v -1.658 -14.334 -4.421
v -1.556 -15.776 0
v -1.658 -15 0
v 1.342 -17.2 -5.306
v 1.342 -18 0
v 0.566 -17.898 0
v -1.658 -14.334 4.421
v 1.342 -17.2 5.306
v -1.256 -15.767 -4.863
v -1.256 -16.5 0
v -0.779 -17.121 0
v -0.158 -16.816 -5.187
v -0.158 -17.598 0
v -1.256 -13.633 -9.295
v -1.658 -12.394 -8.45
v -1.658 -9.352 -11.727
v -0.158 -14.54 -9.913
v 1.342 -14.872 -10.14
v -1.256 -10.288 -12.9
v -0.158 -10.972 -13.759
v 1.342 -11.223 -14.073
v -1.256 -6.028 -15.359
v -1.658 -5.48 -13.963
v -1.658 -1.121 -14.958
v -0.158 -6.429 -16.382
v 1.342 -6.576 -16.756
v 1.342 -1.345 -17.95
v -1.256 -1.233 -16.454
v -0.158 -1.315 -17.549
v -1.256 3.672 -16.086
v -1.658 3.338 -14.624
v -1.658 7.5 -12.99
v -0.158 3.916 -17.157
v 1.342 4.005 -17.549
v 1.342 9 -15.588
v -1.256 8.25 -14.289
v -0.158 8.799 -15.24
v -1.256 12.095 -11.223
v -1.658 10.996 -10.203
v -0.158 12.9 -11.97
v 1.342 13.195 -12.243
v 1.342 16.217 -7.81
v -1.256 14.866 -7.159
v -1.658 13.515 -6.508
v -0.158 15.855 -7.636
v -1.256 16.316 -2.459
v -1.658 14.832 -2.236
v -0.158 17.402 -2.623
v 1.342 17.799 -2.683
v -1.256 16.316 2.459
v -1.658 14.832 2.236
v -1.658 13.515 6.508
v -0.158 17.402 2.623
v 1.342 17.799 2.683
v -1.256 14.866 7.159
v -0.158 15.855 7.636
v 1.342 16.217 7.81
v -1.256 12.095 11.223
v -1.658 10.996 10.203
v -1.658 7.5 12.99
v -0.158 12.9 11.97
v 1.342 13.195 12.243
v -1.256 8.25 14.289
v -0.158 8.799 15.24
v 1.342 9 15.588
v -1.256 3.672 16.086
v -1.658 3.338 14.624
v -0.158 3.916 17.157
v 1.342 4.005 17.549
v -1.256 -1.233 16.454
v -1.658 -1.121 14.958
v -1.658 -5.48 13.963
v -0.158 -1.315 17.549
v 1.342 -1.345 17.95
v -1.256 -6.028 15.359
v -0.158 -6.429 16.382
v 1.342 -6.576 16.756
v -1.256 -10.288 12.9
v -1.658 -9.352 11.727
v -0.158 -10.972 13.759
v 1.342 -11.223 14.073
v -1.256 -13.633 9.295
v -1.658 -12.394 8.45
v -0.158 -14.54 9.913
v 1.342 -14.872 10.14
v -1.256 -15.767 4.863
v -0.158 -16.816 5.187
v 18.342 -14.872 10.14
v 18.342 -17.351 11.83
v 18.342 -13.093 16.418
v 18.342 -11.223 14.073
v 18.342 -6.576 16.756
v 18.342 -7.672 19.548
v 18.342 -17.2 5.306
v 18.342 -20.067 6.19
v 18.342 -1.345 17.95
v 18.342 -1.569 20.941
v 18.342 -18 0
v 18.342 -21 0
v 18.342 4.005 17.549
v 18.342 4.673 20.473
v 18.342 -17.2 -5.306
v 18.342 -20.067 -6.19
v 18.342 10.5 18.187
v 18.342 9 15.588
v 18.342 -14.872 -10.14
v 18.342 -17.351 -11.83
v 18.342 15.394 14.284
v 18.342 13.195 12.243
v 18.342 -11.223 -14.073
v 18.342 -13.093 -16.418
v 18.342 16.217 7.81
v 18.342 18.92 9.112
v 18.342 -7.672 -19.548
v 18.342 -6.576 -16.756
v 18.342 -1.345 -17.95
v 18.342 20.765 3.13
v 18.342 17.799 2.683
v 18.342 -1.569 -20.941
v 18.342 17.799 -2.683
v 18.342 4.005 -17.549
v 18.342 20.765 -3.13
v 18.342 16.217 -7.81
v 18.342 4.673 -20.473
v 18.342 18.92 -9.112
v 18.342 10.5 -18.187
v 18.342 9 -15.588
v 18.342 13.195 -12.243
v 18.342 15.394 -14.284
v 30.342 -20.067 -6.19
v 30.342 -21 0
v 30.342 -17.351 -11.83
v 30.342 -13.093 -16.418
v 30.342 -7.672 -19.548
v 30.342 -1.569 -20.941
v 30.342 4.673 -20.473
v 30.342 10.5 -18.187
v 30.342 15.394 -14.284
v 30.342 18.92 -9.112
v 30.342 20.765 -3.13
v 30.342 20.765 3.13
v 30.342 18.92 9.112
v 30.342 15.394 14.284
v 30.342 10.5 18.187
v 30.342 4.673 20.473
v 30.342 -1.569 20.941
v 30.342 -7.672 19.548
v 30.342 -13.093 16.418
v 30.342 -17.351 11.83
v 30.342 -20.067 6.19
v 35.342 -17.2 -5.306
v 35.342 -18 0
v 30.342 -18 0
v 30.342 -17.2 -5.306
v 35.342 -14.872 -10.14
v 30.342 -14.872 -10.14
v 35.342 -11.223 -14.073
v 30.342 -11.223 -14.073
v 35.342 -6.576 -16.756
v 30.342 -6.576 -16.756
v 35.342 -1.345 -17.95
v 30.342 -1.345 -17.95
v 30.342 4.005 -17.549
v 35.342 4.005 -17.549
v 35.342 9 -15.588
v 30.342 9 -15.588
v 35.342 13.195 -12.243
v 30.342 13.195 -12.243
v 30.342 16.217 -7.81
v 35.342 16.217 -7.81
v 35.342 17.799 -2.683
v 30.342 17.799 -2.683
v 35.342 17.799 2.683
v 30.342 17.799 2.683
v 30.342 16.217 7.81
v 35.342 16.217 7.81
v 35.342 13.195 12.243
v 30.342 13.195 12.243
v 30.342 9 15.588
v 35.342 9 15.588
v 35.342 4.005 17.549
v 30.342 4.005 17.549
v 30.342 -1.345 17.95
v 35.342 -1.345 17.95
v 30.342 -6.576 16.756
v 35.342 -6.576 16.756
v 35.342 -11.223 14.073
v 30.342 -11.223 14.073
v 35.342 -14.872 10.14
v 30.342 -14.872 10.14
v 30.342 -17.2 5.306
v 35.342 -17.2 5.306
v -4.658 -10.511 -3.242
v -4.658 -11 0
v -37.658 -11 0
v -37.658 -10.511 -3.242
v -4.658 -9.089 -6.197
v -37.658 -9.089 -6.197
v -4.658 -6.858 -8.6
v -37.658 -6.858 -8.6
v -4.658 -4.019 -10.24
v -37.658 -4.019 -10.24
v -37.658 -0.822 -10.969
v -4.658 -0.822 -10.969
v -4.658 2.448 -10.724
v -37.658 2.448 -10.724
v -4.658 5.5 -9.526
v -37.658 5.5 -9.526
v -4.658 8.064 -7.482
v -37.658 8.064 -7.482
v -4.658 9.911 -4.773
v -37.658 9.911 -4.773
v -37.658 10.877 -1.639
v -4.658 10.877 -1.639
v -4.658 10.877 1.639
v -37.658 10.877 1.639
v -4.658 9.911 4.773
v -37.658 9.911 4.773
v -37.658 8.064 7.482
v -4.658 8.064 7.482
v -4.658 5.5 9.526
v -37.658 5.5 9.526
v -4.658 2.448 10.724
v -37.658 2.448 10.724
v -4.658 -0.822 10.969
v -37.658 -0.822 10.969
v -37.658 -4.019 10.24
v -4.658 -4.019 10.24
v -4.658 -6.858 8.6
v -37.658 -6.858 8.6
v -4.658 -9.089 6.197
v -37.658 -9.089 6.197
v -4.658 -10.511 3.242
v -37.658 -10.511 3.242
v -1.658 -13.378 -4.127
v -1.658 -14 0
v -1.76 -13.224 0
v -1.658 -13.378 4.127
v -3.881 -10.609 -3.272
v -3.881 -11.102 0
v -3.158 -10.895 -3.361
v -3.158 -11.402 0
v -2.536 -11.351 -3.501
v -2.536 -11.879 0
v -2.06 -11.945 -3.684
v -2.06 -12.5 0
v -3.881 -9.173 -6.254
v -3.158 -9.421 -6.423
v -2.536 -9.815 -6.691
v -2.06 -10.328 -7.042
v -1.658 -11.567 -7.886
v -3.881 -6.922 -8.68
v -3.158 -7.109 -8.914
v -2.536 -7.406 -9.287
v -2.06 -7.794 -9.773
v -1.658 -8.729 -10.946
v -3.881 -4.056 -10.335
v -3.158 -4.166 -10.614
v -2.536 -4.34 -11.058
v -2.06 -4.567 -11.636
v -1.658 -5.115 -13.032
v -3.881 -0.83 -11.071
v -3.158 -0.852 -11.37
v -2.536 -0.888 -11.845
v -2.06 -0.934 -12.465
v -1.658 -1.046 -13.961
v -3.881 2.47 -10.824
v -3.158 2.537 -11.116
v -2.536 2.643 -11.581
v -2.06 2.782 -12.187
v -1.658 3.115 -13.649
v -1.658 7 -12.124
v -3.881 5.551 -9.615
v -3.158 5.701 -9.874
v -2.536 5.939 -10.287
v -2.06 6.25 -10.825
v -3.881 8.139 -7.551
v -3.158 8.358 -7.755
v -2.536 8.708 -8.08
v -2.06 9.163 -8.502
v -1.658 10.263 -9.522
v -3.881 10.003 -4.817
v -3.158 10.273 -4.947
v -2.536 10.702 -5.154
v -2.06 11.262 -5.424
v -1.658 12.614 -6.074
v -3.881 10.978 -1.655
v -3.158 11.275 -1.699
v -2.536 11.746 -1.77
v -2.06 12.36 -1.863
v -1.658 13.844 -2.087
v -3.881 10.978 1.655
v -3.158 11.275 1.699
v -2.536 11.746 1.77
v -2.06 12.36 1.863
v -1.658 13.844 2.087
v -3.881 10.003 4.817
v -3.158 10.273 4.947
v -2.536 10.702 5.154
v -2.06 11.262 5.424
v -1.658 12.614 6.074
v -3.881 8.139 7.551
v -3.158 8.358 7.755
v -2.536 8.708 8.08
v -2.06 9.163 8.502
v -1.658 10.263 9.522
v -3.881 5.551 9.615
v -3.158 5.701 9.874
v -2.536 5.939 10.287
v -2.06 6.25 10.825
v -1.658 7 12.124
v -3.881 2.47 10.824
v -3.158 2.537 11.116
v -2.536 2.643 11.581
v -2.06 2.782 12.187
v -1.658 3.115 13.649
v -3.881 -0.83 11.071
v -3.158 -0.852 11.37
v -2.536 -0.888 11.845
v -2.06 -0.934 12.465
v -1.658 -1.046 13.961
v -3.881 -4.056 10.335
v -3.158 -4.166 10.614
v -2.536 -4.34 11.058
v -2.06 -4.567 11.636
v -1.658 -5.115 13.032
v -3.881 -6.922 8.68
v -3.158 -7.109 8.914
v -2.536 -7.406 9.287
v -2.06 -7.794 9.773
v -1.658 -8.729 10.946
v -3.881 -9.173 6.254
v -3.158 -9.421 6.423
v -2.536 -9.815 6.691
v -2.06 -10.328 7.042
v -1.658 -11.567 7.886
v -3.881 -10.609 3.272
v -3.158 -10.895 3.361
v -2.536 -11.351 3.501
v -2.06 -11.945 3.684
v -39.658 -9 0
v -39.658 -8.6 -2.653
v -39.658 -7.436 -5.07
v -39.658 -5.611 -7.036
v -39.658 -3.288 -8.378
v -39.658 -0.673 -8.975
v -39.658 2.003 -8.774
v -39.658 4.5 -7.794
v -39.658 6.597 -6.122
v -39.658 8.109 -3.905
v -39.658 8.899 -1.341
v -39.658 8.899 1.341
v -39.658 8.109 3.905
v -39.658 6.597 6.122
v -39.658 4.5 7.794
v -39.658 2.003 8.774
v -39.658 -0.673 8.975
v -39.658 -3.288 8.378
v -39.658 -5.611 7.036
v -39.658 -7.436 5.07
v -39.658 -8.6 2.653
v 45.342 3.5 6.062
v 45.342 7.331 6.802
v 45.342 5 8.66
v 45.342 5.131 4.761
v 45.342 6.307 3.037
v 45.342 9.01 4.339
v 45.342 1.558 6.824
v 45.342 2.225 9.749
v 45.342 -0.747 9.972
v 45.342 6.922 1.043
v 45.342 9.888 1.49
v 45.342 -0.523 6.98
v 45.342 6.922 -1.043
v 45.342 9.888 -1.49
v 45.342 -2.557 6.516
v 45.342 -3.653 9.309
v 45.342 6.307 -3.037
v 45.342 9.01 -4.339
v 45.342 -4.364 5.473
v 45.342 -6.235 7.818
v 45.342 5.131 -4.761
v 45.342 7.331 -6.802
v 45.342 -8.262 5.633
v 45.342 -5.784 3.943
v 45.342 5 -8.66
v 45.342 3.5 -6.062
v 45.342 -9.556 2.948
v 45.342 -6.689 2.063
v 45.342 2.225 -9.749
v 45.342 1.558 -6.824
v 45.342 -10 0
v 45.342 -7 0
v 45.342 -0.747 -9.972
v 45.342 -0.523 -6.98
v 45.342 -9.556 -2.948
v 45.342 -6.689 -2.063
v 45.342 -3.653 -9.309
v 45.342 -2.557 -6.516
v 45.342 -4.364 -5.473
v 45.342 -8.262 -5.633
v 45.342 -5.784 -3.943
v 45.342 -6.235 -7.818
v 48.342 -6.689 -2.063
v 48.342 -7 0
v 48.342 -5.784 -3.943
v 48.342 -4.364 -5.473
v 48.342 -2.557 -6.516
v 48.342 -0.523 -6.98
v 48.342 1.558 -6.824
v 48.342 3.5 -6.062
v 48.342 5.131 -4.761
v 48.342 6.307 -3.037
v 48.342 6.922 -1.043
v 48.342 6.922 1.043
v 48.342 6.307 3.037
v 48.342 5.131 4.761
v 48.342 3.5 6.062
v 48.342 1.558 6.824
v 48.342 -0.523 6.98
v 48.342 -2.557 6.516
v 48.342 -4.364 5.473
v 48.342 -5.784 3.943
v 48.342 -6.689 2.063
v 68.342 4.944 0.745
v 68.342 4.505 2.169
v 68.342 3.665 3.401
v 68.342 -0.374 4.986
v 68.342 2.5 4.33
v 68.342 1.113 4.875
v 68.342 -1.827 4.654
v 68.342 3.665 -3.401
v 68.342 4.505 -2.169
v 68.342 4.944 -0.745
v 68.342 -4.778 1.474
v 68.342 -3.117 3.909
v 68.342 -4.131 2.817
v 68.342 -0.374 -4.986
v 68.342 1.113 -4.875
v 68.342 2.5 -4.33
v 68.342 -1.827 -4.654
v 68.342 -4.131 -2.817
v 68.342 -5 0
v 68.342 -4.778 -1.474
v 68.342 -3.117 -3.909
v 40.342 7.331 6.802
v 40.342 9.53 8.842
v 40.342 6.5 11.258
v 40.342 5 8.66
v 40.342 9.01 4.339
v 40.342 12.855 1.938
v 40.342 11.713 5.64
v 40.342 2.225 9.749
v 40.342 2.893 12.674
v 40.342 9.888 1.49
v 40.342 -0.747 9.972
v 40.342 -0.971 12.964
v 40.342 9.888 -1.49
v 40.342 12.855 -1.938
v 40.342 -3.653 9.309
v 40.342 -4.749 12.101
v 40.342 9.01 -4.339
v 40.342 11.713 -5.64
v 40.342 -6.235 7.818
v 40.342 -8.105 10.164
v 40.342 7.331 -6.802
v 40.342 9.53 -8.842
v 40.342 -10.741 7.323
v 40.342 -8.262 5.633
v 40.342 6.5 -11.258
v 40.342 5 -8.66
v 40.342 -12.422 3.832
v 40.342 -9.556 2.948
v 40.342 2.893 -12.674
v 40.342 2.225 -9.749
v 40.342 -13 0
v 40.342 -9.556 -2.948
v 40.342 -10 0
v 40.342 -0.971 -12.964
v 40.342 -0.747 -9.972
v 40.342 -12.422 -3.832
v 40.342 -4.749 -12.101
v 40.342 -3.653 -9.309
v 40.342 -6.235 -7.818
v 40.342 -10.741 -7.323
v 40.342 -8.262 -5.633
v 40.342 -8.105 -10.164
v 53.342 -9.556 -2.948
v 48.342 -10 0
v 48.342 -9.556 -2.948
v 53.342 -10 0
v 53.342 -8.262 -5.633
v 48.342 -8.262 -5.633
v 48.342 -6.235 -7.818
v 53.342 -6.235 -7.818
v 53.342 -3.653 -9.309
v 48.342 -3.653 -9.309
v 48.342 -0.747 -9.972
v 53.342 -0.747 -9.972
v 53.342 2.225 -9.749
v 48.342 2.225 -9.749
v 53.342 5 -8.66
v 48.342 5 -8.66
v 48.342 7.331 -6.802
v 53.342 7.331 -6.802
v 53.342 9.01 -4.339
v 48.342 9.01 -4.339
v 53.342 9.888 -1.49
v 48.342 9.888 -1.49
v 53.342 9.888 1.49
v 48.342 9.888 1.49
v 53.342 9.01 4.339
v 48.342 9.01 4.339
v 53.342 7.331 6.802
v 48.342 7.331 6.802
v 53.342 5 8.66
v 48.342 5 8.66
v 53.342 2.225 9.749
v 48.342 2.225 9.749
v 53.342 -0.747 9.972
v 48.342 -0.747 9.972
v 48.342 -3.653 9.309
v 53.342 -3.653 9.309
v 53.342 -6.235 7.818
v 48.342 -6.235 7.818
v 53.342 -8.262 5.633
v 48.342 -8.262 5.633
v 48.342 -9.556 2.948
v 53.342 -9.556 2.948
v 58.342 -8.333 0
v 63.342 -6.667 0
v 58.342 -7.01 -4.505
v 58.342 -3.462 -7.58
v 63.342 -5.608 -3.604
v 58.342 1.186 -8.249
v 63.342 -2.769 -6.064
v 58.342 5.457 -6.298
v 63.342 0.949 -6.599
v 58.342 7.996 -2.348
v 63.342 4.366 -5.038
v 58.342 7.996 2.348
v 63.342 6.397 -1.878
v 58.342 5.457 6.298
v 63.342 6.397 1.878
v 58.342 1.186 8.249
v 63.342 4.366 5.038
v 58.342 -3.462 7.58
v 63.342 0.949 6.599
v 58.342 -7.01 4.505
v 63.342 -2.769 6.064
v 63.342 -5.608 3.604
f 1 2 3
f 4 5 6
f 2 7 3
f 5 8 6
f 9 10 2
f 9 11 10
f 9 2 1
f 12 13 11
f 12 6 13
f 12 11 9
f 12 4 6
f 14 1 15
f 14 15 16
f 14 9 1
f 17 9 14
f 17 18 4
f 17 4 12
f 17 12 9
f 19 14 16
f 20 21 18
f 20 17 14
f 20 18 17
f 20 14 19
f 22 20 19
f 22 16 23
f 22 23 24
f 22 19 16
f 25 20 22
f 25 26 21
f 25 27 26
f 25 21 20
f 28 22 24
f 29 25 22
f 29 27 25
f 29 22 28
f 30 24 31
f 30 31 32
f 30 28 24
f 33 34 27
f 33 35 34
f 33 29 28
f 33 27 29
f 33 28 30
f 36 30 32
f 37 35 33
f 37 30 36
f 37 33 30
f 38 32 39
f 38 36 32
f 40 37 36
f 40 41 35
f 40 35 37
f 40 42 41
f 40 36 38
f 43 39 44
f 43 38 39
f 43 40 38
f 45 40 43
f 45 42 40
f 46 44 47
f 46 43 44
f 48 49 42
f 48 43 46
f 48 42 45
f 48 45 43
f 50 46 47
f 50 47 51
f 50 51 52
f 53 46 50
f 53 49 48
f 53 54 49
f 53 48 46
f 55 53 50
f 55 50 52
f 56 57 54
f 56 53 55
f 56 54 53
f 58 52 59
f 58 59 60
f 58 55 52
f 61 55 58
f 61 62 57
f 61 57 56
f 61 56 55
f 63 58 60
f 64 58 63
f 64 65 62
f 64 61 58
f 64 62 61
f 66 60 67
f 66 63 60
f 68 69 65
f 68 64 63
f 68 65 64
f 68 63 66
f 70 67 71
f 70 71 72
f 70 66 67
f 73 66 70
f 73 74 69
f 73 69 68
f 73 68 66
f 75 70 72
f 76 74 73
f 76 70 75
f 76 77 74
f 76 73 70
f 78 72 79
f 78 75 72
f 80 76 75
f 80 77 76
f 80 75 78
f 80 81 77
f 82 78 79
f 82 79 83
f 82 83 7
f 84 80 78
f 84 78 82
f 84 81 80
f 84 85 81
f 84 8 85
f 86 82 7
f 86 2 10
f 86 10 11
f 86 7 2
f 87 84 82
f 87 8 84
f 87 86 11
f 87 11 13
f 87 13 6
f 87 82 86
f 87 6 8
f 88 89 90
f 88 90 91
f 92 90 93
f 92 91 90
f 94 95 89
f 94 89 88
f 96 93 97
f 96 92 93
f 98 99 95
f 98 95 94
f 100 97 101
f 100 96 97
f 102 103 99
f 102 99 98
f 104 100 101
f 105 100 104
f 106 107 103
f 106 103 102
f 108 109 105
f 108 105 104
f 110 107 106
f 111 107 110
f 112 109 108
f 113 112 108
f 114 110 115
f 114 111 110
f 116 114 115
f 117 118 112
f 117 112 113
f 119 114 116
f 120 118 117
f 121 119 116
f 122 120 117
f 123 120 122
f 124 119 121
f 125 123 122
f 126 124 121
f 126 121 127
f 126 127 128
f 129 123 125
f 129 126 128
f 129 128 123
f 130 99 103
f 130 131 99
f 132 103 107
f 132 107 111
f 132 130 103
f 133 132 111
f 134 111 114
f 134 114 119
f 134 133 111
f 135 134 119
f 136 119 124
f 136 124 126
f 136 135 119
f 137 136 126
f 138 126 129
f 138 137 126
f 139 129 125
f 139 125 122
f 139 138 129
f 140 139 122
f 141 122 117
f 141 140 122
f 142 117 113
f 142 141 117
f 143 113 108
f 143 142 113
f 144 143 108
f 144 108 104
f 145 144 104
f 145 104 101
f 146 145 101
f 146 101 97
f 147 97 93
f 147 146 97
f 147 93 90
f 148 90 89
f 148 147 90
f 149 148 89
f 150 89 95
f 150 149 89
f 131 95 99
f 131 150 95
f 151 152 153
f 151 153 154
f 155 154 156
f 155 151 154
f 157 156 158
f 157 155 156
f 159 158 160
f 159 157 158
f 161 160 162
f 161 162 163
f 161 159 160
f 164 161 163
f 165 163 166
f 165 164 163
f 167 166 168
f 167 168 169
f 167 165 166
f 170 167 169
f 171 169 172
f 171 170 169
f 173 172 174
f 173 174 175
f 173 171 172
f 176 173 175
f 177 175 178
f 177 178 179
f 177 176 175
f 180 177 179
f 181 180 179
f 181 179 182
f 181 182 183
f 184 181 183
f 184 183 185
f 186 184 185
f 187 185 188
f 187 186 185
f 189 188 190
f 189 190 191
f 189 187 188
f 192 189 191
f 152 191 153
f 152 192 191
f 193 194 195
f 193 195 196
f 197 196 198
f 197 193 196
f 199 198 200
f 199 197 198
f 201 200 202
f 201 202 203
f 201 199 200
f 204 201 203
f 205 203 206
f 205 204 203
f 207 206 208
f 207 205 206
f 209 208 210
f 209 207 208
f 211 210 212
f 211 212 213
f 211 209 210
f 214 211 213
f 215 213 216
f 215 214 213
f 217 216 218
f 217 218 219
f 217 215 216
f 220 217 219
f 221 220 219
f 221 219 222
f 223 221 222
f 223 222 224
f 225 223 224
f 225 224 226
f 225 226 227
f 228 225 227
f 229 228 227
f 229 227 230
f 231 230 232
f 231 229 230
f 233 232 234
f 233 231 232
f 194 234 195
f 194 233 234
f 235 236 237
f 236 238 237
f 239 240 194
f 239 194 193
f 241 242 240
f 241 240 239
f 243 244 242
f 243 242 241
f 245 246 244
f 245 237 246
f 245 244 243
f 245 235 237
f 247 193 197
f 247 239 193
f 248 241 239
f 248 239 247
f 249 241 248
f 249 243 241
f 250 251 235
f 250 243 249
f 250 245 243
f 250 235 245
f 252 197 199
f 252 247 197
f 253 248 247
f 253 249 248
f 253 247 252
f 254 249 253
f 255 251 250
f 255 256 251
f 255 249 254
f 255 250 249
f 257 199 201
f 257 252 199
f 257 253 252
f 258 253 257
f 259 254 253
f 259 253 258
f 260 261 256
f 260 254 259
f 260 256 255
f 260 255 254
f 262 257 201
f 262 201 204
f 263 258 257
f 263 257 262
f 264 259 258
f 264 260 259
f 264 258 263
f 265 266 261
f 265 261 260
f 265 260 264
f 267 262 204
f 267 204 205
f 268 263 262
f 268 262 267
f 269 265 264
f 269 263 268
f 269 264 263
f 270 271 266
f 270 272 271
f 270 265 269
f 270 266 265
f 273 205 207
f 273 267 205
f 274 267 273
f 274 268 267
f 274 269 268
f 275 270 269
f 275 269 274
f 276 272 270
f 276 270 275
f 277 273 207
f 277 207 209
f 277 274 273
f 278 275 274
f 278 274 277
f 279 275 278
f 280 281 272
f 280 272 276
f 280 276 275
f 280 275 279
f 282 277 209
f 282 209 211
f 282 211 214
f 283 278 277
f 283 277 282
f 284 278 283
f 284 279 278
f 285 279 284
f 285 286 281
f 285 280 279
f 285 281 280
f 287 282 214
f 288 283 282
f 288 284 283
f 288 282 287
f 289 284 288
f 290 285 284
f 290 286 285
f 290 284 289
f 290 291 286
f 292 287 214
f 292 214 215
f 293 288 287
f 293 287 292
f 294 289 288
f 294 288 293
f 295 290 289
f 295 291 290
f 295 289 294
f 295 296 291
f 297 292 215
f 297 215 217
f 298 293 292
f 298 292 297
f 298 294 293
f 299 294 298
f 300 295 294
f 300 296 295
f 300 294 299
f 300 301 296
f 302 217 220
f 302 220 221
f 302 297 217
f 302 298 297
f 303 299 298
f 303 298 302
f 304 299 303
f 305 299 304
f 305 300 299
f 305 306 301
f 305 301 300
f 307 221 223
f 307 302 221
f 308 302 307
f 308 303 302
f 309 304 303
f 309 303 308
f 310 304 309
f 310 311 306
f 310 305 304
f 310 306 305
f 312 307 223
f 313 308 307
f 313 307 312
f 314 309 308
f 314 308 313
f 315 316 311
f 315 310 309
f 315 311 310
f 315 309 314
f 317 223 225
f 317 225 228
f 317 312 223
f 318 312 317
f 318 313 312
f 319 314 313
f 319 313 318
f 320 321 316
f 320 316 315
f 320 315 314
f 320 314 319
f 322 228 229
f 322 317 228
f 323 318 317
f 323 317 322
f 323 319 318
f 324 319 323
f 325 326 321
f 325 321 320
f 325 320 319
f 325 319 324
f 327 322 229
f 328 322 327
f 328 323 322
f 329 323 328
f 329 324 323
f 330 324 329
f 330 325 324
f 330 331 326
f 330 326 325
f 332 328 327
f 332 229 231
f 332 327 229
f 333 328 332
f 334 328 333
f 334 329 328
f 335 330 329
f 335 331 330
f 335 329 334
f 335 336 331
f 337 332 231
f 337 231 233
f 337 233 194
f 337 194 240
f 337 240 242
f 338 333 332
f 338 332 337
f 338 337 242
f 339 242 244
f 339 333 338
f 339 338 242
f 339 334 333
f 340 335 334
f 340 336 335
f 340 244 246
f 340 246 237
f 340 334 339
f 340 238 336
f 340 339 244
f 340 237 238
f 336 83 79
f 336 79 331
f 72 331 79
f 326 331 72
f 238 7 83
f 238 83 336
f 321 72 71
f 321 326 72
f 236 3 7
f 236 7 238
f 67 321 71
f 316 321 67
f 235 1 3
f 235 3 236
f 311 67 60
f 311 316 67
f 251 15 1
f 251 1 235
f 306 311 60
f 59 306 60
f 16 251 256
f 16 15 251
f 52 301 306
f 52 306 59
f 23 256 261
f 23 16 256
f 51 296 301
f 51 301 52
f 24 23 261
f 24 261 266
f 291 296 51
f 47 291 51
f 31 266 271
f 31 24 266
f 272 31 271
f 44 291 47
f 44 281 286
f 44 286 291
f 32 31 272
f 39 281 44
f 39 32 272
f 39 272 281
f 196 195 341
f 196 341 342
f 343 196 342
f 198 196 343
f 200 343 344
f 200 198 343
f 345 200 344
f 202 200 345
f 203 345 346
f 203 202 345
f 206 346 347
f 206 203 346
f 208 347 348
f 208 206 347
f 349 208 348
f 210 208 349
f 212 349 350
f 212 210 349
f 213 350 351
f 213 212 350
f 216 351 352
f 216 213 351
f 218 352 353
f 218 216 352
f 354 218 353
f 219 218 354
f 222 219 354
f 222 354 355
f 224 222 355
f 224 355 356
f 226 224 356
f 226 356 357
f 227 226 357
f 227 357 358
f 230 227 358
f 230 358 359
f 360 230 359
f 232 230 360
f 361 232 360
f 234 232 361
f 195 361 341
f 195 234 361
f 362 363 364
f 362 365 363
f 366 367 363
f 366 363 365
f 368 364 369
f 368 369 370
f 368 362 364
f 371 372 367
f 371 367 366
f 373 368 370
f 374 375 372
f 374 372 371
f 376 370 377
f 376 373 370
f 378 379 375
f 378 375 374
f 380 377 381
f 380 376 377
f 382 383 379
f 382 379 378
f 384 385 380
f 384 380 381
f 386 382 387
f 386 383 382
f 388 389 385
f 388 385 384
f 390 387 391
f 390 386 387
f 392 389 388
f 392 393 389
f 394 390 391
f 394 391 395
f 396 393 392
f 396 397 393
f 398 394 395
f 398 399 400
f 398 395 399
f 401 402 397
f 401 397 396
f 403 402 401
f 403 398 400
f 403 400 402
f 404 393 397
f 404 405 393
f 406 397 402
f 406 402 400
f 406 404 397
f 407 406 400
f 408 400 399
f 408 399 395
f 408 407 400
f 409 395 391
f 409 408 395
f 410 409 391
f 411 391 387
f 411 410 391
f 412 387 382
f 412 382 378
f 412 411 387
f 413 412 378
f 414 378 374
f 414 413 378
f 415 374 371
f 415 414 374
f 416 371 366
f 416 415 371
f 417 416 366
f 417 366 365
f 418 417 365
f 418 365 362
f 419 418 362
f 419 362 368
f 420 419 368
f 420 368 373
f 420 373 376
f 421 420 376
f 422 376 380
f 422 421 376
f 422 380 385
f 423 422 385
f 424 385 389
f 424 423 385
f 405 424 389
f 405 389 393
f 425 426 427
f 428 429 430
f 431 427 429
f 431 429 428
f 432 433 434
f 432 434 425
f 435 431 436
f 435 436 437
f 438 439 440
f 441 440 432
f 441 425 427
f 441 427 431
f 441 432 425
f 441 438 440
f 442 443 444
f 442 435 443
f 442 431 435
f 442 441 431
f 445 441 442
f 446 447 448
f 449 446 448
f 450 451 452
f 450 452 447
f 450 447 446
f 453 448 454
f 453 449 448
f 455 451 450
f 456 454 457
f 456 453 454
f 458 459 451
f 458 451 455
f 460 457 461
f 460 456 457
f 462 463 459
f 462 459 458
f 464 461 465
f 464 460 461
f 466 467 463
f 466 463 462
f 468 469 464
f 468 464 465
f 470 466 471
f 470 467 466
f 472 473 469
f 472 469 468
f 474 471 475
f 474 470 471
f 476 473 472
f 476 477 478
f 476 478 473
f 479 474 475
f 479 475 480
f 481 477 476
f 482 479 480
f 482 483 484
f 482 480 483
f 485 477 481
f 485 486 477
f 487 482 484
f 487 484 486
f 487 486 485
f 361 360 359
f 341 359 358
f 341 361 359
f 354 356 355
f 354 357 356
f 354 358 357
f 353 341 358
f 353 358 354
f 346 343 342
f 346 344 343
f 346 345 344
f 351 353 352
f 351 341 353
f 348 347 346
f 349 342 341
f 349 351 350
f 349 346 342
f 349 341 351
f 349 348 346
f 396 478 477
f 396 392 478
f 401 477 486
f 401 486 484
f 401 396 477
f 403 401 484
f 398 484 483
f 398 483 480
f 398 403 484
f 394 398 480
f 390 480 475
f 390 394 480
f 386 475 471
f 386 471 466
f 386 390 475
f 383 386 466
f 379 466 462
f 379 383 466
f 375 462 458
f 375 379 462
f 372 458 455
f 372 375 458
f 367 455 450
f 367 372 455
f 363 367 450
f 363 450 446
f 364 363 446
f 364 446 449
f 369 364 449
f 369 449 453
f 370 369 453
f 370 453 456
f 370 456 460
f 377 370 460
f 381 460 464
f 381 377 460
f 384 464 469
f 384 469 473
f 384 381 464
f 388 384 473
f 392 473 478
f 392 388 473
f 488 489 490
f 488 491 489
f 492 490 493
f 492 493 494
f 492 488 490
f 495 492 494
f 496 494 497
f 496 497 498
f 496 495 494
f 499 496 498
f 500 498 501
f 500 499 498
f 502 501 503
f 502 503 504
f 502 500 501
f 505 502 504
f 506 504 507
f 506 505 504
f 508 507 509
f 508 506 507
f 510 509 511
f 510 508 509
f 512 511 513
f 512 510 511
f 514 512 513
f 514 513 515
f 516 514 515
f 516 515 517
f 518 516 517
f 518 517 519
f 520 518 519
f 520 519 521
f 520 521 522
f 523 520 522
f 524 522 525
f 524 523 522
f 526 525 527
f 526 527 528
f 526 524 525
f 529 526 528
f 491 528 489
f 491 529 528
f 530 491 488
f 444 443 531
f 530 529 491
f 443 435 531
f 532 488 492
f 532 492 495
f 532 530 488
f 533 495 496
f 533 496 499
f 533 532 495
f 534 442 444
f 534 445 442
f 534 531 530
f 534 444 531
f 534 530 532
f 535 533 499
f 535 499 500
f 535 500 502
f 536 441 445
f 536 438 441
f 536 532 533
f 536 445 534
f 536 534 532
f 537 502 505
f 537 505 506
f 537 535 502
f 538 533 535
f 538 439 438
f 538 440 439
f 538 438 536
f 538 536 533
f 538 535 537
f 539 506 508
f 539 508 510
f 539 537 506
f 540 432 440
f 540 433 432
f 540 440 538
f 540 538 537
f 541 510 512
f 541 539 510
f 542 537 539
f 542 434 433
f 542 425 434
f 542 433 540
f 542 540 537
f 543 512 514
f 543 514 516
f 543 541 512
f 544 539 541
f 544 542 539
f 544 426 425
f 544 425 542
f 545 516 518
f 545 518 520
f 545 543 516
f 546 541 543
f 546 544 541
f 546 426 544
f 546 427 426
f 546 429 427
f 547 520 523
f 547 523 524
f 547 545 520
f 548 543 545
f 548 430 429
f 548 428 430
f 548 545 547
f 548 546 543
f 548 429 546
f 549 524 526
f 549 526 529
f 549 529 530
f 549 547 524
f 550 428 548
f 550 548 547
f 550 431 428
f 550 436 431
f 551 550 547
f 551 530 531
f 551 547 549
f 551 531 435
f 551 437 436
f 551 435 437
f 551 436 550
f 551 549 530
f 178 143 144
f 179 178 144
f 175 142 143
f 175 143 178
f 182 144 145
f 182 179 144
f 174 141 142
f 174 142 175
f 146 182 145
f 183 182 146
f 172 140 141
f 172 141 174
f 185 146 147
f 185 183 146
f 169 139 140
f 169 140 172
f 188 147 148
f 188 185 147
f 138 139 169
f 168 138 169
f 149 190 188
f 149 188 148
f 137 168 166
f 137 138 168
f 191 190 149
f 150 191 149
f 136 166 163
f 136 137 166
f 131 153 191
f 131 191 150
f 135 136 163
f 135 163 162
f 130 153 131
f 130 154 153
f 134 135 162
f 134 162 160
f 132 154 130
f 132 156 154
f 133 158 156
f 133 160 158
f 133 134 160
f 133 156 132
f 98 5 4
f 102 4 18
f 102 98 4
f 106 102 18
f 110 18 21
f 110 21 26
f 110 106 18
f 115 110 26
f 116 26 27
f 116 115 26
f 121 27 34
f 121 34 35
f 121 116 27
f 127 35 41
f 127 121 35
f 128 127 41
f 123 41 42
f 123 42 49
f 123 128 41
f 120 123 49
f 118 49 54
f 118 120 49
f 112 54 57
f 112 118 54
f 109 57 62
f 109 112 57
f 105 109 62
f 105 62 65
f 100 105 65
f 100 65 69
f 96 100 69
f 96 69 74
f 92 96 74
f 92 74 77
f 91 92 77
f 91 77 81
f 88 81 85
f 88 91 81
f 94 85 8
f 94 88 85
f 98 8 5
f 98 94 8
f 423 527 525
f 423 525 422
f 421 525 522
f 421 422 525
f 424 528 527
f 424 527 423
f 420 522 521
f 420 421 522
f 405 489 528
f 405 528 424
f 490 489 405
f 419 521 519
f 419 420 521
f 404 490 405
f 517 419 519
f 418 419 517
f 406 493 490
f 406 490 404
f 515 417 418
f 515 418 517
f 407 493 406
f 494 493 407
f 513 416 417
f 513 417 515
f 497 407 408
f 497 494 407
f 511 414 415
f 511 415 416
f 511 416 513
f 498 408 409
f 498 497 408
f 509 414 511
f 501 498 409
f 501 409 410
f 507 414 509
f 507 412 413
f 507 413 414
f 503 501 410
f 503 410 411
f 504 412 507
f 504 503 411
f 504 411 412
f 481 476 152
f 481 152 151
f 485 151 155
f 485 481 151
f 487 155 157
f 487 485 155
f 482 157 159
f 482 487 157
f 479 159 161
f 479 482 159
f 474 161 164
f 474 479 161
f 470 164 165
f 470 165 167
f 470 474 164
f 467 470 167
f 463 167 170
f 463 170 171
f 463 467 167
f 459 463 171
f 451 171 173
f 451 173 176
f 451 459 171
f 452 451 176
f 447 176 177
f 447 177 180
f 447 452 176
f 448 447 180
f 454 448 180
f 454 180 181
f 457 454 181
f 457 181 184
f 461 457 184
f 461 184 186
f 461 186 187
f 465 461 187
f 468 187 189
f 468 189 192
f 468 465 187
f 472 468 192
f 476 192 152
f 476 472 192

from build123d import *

# Parameters (mm, degrees)
F2_SIZE2 = 2
F2_SIZE  = 2
F3_R     = 3
F4_SIZE  = 5


with BuildPart() as f1:
    # F0 (on Top) → F1 (revolve)
    with BuildSketch(Plane.XY):
        Polygon((68.342246, 0), (-39.657754, 0), (-39.657754, -11), (-1.657754, -11), (-1.657754, -18), (18.342246, -18), (18.342246, -21), (30.342246, -21), (30.342246, -18), (40.342246, -18), (40.342246, -10), (45.342246, -10), (45.342246, -7), (48.342246, -7), (48.342246, -10), (53.342246, -10), (68.342246, -5), align=None)
    revolve(axis=Axis((14.342246, 0, 0), (1, 0, 0)))

    # F2
    f2_edges = [f1.edges().sort_by_distance(p)[0] for p in [
        (-39.657754, 11, 0),
    ]]
    chamfer(f2_edges, length=F2_SIZE, length2=F2_SIZE2)

    # F3
    f3_edges = [f1.edges().sort_by_distance(p)[0] for p in [
        (-1.657754, 18, 0),
        (-1.657754, 11, 0),
    ]]
    fillet(f3_edges, radius=F3_R)

    # F4
    f4_edges = [f1.edges().sort_by_distance(p)[0] for p in [
        (40.342246, 18, 0),
    ]]
    chamfer(f4_edges, length=F4_SIZE)


solid = f1.part
